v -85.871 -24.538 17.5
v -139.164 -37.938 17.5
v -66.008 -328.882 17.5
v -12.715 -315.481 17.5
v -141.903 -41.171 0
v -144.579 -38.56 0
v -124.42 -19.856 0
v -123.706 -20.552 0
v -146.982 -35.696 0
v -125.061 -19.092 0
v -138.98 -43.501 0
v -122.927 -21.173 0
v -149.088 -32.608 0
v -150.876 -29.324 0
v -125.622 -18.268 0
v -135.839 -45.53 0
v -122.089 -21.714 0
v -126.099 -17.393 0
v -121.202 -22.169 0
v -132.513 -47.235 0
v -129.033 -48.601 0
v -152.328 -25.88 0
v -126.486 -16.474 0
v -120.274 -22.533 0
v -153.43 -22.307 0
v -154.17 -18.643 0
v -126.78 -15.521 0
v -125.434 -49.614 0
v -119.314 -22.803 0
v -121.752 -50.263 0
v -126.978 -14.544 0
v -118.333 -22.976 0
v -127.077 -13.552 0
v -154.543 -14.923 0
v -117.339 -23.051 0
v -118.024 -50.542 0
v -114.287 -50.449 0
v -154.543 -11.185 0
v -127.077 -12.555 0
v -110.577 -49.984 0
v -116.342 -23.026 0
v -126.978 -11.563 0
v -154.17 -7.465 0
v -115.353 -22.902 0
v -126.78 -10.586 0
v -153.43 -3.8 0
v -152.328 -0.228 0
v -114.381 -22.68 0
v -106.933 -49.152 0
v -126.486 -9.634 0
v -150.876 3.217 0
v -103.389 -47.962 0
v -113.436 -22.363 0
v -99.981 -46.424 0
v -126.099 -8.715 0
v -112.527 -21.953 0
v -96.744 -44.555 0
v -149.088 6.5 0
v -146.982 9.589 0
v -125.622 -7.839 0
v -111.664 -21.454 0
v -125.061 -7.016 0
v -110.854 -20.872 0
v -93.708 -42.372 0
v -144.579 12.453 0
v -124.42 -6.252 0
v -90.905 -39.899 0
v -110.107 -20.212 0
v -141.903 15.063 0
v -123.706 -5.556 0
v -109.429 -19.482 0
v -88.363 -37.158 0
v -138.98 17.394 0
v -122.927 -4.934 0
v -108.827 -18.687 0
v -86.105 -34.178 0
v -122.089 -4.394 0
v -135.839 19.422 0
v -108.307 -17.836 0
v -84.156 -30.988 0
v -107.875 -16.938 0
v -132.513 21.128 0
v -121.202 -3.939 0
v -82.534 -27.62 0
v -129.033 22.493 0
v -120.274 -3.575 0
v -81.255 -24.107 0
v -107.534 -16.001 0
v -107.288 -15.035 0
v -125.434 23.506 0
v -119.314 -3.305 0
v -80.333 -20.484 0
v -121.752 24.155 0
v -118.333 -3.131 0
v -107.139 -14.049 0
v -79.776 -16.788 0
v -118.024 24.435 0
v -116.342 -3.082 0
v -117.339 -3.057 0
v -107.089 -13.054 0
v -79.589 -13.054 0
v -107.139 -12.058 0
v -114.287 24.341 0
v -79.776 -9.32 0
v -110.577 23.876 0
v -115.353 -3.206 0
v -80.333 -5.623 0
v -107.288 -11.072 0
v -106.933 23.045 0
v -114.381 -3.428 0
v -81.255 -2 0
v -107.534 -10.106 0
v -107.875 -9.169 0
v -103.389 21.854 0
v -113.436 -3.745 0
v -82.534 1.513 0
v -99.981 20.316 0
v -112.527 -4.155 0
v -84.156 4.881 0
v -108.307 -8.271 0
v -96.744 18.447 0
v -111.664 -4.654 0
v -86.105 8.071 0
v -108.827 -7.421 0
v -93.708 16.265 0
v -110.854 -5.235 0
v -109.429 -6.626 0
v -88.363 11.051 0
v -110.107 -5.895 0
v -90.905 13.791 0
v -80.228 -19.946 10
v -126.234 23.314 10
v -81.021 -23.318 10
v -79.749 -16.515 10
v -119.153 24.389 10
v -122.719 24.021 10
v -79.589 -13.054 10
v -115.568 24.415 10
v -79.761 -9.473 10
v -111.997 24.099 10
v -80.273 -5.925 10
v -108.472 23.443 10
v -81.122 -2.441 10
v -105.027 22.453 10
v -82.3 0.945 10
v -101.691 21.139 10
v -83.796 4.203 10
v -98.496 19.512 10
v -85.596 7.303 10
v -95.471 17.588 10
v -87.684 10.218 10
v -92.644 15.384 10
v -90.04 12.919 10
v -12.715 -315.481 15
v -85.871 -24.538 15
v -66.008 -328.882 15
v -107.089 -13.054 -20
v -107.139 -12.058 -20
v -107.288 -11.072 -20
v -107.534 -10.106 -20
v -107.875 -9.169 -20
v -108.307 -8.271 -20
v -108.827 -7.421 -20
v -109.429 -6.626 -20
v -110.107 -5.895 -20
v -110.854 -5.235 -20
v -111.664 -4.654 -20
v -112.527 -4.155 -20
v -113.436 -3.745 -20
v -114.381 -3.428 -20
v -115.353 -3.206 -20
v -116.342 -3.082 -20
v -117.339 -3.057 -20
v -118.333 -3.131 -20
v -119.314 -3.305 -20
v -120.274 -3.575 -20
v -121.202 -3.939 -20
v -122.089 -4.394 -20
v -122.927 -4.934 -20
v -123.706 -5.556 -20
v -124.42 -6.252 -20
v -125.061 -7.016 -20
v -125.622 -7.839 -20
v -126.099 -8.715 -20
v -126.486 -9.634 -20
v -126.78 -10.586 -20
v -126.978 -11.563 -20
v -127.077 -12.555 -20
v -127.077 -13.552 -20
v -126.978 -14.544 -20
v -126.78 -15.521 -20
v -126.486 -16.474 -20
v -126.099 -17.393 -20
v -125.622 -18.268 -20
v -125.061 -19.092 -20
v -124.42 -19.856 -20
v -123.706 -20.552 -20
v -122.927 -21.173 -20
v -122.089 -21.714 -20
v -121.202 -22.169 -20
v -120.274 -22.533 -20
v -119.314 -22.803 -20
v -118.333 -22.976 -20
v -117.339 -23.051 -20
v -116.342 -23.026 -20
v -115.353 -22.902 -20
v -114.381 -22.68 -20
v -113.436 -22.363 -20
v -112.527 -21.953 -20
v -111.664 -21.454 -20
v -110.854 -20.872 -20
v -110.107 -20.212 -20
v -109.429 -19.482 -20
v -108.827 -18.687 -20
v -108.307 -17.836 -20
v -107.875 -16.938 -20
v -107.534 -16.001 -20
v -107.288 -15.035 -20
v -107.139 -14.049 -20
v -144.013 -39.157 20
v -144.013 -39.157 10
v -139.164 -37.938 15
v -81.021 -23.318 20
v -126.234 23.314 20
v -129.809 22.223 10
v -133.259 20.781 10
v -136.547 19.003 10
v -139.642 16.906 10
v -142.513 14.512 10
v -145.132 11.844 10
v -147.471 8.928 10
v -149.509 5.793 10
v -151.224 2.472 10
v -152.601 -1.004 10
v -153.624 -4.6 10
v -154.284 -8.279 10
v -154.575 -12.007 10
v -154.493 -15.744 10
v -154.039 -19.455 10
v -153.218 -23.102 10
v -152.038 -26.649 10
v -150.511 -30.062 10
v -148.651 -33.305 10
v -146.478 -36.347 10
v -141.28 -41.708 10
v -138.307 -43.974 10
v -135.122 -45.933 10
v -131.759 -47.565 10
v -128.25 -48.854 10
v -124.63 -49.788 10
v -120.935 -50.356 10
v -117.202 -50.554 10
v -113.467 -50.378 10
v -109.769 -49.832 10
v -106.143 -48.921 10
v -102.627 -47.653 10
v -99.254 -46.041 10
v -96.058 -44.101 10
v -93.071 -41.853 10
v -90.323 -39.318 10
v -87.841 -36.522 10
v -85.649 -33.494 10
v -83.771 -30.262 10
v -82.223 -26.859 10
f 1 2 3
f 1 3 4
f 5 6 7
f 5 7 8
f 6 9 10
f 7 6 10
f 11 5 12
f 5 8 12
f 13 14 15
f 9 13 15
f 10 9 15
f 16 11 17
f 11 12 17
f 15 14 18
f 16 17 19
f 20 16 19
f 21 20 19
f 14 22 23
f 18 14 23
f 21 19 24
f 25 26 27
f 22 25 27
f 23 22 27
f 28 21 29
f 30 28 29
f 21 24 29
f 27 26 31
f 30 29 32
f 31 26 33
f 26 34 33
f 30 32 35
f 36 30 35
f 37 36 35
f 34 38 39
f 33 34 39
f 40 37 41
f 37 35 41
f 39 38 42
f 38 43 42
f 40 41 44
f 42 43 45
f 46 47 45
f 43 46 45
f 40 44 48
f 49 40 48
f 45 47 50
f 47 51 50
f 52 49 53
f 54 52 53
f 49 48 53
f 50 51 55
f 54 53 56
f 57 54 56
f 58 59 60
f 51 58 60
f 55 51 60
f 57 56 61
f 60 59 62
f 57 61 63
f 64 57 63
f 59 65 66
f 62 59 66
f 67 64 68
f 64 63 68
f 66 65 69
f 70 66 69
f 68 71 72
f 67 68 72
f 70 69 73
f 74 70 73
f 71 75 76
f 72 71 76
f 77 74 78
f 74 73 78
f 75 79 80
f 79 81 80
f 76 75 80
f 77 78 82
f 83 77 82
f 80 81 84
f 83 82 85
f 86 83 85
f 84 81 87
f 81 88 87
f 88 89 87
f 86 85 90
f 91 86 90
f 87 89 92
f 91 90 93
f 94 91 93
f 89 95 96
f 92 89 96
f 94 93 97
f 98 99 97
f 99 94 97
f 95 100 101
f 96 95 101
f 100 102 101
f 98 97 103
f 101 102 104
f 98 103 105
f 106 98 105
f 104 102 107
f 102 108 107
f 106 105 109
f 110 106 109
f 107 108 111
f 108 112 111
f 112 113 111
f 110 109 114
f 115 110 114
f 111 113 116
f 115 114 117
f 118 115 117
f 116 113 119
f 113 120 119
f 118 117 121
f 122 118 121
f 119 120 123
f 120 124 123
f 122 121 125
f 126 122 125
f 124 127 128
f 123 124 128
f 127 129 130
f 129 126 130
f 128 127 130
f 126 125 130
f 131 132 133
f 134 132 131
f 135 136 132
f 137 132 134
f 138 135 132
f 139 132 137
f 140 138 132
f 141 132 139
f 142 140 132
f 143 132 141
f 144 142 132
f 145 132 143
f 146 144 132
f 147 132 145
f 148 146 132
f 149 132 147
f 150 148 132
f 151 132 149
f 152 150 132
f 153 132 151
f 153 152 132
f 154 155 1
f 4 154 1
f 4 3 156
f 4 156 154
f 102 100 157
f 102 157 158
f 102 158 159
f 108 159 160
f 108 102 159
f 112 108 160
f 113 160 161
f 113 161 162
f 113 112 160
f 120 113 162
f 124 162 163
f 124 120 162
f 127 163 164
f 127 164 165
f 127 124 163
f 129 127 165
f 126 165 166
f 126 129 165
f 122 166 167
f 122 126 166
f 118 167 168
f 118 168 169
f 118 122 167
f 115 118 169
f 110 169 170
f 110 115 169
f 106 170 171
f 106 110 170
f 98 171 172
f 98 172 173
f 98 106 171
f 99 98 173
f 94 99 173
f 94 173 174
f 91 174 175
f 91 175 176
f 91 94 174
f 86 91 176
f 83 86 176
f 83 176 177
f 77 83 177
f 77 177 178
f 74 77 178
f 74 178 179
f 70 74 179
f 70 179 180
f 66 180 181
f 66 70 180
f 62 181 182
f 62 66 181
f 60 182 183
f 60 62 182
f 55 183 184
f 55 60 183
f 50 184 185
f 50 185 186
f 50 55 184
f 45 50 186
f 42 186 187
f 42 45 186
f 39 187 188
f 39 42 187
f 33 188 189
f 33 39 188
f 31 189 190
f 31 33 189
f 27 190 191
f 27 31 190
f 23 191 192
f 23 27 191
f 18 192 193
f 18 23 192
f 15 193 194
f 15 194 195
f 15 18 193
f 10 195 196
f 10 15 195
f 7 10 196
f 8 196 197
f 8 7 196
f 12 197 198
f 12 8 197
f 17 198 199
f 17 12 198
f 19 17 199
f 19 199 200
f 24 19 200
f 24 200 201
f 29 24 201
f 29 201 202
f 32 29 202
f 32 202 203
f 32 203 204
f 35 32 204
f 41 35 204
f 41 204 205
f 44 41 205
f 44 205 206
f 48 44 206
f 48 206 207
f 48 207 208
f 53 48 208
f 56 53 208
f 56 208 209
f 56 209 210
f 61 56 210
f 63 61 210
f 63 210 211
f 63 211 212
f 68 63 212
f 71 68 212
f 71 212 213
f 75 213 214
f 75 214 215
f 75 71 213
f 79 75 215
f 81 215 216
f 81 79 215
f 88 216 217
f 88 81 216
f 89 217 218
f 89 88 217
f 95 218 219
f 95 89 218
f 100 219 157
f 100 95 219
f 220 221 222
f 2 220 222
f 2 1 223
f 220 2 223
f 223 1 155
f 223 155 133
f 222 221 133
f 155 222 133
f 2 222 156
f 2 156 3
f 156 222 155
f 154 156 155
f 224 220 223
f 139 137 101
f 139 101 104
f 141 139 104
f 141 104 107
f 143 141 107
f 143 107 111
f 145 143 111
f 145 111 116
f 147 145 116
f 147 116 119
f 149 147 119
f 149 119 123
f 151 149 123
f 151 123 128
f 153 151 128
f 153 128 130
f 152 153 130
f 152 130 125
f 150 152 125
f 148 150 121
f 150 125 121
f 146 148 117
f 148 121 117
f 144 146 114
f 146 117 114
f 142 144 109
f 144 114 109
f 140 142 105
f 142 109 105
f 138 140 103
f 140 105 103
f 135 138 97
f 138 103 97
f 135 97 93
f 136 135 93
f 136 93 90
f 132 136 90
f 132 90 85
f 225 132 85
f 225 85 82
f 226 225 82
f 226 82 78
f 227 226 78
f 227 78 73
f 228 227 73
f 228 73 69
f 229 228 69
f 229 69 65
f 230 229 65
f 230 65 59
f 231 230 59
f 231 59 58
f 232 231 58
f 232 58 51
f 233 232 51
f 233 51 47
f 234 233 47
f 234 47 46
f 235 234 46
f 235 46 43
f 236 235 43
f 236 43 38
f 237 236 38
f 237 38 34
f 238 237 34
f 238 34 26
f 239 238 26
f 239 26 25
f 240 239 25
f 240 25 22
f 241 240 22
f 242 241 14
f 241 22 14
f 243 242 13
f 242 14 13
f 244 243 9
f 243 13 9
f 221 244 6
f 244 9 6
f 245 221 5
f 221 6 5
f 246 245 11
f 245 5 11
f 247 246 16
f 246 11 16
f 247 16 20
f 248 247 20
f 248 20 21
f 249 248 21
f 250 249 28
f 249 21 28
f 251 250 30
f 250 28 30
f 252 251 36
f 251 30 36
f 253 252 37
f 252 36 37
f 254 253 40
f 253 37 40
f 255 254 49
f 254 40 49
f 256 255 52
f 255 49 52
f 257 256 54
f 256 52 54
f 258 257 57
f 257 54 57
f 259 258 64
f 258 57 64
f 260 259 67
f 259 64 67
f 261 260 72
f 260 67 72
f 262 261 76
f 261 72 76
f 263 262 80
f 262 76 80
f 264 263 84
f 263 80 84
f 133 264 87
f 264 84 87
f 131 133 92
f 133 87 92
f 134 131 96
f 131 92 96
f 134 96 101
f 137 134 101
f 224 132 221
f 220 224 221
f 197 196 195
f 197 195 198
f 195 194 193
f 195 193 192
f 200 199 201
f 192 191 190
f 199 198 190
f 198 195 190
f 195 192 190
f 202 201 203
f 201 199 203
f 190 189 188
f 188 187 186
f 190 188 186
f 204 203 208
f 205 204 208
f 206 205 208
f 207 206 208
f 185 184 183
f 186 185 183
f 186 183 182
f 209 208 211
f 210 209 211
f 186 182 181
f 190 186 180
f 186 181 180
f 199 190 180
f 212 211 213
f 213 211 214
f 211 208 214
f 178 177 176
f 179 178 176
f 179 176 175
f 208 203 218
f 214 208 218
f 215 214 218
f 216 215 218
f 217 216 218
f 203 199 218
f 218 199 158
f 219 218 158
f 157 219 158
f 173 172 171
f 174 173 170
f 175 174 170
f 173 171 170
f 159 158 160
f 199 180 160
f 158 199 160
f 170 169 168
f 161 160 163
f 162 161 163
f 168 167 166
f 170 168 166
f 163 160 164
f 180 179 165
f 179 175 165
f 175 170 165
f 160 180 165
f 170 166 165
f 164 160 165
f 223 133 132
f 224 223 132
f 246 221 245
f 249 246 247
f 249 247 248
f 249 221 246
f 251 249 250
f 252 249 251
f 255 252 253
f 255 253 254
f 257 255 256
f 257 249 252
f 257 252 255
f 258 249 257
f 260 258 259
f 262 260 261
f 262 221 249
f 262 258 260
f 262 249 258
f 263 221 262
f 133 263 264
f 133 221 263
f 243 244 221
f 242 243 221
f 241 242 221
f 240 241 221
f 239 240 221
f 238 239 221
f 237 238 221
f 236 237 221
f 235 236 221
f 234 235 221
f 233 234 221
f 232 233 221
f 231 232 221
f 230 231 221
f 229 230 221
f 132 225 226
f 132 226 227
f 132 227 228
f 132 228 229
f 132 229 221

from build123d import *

# Parameters (mm, degrees)
F0_R     = 37.5
F0_R_2   = 10
F1_DEPTH = 10
F3_DEPTH = 10
F4_W     = 54.9519052838
F4_H     = 2.5
F5_DEPTH = 300
F6_DEPTH = 20


with BuildPart() as f1:
    # F0 (on Top) → F1 (new body)
    with BuildSketch(Plane.XY):
        with Locations((-117.0892864466, -13.0537990481)):
            Circle(F0_R)
        with Locations((-117.0892864466, -13.0537990481)):
            Circle(F0_R_2, mode=Mode.SUBTRACT)
        with Locations((-117.0892864466, -13.0537990481)):
            Circle(F0_R_2)
    extrude(amount=F1_DEPTH)

    # F2 (on face) → F3 (join)
    with BuildSketch(Plane.XY.offset(10)):
        Polygon((-144.0126514019, -39.1571018943), (-81.0214805814, -23.3184656317), (-126.2337273564, 23.3141703817), align=None)
    extrude(amount=F3_DEPTH)

    # F4 (on face) → F5 (join)
    with BuildSketch(Plane(origin=(0.6967599266, -2.7710544537, 0), x_dir=(0.9698125181, 0.2438517576, 0), z_dir=(0.2438517576, -0.9698125181, 0))):
        with Locations((-116.7378475757, 16.25)):
            Rectangle(F4_W, F4_H)
    extrude(amount=F5_DEPTH)

    # F0 (on Top) → F6 (join)
    with BuildSketch(Plane.XY):
        with Locations((-117.0892864466, -13.0537990481)):
            Circle(F0_R_2)
    extrude(amount=-F6_DEPTH)


solid = f1.part
